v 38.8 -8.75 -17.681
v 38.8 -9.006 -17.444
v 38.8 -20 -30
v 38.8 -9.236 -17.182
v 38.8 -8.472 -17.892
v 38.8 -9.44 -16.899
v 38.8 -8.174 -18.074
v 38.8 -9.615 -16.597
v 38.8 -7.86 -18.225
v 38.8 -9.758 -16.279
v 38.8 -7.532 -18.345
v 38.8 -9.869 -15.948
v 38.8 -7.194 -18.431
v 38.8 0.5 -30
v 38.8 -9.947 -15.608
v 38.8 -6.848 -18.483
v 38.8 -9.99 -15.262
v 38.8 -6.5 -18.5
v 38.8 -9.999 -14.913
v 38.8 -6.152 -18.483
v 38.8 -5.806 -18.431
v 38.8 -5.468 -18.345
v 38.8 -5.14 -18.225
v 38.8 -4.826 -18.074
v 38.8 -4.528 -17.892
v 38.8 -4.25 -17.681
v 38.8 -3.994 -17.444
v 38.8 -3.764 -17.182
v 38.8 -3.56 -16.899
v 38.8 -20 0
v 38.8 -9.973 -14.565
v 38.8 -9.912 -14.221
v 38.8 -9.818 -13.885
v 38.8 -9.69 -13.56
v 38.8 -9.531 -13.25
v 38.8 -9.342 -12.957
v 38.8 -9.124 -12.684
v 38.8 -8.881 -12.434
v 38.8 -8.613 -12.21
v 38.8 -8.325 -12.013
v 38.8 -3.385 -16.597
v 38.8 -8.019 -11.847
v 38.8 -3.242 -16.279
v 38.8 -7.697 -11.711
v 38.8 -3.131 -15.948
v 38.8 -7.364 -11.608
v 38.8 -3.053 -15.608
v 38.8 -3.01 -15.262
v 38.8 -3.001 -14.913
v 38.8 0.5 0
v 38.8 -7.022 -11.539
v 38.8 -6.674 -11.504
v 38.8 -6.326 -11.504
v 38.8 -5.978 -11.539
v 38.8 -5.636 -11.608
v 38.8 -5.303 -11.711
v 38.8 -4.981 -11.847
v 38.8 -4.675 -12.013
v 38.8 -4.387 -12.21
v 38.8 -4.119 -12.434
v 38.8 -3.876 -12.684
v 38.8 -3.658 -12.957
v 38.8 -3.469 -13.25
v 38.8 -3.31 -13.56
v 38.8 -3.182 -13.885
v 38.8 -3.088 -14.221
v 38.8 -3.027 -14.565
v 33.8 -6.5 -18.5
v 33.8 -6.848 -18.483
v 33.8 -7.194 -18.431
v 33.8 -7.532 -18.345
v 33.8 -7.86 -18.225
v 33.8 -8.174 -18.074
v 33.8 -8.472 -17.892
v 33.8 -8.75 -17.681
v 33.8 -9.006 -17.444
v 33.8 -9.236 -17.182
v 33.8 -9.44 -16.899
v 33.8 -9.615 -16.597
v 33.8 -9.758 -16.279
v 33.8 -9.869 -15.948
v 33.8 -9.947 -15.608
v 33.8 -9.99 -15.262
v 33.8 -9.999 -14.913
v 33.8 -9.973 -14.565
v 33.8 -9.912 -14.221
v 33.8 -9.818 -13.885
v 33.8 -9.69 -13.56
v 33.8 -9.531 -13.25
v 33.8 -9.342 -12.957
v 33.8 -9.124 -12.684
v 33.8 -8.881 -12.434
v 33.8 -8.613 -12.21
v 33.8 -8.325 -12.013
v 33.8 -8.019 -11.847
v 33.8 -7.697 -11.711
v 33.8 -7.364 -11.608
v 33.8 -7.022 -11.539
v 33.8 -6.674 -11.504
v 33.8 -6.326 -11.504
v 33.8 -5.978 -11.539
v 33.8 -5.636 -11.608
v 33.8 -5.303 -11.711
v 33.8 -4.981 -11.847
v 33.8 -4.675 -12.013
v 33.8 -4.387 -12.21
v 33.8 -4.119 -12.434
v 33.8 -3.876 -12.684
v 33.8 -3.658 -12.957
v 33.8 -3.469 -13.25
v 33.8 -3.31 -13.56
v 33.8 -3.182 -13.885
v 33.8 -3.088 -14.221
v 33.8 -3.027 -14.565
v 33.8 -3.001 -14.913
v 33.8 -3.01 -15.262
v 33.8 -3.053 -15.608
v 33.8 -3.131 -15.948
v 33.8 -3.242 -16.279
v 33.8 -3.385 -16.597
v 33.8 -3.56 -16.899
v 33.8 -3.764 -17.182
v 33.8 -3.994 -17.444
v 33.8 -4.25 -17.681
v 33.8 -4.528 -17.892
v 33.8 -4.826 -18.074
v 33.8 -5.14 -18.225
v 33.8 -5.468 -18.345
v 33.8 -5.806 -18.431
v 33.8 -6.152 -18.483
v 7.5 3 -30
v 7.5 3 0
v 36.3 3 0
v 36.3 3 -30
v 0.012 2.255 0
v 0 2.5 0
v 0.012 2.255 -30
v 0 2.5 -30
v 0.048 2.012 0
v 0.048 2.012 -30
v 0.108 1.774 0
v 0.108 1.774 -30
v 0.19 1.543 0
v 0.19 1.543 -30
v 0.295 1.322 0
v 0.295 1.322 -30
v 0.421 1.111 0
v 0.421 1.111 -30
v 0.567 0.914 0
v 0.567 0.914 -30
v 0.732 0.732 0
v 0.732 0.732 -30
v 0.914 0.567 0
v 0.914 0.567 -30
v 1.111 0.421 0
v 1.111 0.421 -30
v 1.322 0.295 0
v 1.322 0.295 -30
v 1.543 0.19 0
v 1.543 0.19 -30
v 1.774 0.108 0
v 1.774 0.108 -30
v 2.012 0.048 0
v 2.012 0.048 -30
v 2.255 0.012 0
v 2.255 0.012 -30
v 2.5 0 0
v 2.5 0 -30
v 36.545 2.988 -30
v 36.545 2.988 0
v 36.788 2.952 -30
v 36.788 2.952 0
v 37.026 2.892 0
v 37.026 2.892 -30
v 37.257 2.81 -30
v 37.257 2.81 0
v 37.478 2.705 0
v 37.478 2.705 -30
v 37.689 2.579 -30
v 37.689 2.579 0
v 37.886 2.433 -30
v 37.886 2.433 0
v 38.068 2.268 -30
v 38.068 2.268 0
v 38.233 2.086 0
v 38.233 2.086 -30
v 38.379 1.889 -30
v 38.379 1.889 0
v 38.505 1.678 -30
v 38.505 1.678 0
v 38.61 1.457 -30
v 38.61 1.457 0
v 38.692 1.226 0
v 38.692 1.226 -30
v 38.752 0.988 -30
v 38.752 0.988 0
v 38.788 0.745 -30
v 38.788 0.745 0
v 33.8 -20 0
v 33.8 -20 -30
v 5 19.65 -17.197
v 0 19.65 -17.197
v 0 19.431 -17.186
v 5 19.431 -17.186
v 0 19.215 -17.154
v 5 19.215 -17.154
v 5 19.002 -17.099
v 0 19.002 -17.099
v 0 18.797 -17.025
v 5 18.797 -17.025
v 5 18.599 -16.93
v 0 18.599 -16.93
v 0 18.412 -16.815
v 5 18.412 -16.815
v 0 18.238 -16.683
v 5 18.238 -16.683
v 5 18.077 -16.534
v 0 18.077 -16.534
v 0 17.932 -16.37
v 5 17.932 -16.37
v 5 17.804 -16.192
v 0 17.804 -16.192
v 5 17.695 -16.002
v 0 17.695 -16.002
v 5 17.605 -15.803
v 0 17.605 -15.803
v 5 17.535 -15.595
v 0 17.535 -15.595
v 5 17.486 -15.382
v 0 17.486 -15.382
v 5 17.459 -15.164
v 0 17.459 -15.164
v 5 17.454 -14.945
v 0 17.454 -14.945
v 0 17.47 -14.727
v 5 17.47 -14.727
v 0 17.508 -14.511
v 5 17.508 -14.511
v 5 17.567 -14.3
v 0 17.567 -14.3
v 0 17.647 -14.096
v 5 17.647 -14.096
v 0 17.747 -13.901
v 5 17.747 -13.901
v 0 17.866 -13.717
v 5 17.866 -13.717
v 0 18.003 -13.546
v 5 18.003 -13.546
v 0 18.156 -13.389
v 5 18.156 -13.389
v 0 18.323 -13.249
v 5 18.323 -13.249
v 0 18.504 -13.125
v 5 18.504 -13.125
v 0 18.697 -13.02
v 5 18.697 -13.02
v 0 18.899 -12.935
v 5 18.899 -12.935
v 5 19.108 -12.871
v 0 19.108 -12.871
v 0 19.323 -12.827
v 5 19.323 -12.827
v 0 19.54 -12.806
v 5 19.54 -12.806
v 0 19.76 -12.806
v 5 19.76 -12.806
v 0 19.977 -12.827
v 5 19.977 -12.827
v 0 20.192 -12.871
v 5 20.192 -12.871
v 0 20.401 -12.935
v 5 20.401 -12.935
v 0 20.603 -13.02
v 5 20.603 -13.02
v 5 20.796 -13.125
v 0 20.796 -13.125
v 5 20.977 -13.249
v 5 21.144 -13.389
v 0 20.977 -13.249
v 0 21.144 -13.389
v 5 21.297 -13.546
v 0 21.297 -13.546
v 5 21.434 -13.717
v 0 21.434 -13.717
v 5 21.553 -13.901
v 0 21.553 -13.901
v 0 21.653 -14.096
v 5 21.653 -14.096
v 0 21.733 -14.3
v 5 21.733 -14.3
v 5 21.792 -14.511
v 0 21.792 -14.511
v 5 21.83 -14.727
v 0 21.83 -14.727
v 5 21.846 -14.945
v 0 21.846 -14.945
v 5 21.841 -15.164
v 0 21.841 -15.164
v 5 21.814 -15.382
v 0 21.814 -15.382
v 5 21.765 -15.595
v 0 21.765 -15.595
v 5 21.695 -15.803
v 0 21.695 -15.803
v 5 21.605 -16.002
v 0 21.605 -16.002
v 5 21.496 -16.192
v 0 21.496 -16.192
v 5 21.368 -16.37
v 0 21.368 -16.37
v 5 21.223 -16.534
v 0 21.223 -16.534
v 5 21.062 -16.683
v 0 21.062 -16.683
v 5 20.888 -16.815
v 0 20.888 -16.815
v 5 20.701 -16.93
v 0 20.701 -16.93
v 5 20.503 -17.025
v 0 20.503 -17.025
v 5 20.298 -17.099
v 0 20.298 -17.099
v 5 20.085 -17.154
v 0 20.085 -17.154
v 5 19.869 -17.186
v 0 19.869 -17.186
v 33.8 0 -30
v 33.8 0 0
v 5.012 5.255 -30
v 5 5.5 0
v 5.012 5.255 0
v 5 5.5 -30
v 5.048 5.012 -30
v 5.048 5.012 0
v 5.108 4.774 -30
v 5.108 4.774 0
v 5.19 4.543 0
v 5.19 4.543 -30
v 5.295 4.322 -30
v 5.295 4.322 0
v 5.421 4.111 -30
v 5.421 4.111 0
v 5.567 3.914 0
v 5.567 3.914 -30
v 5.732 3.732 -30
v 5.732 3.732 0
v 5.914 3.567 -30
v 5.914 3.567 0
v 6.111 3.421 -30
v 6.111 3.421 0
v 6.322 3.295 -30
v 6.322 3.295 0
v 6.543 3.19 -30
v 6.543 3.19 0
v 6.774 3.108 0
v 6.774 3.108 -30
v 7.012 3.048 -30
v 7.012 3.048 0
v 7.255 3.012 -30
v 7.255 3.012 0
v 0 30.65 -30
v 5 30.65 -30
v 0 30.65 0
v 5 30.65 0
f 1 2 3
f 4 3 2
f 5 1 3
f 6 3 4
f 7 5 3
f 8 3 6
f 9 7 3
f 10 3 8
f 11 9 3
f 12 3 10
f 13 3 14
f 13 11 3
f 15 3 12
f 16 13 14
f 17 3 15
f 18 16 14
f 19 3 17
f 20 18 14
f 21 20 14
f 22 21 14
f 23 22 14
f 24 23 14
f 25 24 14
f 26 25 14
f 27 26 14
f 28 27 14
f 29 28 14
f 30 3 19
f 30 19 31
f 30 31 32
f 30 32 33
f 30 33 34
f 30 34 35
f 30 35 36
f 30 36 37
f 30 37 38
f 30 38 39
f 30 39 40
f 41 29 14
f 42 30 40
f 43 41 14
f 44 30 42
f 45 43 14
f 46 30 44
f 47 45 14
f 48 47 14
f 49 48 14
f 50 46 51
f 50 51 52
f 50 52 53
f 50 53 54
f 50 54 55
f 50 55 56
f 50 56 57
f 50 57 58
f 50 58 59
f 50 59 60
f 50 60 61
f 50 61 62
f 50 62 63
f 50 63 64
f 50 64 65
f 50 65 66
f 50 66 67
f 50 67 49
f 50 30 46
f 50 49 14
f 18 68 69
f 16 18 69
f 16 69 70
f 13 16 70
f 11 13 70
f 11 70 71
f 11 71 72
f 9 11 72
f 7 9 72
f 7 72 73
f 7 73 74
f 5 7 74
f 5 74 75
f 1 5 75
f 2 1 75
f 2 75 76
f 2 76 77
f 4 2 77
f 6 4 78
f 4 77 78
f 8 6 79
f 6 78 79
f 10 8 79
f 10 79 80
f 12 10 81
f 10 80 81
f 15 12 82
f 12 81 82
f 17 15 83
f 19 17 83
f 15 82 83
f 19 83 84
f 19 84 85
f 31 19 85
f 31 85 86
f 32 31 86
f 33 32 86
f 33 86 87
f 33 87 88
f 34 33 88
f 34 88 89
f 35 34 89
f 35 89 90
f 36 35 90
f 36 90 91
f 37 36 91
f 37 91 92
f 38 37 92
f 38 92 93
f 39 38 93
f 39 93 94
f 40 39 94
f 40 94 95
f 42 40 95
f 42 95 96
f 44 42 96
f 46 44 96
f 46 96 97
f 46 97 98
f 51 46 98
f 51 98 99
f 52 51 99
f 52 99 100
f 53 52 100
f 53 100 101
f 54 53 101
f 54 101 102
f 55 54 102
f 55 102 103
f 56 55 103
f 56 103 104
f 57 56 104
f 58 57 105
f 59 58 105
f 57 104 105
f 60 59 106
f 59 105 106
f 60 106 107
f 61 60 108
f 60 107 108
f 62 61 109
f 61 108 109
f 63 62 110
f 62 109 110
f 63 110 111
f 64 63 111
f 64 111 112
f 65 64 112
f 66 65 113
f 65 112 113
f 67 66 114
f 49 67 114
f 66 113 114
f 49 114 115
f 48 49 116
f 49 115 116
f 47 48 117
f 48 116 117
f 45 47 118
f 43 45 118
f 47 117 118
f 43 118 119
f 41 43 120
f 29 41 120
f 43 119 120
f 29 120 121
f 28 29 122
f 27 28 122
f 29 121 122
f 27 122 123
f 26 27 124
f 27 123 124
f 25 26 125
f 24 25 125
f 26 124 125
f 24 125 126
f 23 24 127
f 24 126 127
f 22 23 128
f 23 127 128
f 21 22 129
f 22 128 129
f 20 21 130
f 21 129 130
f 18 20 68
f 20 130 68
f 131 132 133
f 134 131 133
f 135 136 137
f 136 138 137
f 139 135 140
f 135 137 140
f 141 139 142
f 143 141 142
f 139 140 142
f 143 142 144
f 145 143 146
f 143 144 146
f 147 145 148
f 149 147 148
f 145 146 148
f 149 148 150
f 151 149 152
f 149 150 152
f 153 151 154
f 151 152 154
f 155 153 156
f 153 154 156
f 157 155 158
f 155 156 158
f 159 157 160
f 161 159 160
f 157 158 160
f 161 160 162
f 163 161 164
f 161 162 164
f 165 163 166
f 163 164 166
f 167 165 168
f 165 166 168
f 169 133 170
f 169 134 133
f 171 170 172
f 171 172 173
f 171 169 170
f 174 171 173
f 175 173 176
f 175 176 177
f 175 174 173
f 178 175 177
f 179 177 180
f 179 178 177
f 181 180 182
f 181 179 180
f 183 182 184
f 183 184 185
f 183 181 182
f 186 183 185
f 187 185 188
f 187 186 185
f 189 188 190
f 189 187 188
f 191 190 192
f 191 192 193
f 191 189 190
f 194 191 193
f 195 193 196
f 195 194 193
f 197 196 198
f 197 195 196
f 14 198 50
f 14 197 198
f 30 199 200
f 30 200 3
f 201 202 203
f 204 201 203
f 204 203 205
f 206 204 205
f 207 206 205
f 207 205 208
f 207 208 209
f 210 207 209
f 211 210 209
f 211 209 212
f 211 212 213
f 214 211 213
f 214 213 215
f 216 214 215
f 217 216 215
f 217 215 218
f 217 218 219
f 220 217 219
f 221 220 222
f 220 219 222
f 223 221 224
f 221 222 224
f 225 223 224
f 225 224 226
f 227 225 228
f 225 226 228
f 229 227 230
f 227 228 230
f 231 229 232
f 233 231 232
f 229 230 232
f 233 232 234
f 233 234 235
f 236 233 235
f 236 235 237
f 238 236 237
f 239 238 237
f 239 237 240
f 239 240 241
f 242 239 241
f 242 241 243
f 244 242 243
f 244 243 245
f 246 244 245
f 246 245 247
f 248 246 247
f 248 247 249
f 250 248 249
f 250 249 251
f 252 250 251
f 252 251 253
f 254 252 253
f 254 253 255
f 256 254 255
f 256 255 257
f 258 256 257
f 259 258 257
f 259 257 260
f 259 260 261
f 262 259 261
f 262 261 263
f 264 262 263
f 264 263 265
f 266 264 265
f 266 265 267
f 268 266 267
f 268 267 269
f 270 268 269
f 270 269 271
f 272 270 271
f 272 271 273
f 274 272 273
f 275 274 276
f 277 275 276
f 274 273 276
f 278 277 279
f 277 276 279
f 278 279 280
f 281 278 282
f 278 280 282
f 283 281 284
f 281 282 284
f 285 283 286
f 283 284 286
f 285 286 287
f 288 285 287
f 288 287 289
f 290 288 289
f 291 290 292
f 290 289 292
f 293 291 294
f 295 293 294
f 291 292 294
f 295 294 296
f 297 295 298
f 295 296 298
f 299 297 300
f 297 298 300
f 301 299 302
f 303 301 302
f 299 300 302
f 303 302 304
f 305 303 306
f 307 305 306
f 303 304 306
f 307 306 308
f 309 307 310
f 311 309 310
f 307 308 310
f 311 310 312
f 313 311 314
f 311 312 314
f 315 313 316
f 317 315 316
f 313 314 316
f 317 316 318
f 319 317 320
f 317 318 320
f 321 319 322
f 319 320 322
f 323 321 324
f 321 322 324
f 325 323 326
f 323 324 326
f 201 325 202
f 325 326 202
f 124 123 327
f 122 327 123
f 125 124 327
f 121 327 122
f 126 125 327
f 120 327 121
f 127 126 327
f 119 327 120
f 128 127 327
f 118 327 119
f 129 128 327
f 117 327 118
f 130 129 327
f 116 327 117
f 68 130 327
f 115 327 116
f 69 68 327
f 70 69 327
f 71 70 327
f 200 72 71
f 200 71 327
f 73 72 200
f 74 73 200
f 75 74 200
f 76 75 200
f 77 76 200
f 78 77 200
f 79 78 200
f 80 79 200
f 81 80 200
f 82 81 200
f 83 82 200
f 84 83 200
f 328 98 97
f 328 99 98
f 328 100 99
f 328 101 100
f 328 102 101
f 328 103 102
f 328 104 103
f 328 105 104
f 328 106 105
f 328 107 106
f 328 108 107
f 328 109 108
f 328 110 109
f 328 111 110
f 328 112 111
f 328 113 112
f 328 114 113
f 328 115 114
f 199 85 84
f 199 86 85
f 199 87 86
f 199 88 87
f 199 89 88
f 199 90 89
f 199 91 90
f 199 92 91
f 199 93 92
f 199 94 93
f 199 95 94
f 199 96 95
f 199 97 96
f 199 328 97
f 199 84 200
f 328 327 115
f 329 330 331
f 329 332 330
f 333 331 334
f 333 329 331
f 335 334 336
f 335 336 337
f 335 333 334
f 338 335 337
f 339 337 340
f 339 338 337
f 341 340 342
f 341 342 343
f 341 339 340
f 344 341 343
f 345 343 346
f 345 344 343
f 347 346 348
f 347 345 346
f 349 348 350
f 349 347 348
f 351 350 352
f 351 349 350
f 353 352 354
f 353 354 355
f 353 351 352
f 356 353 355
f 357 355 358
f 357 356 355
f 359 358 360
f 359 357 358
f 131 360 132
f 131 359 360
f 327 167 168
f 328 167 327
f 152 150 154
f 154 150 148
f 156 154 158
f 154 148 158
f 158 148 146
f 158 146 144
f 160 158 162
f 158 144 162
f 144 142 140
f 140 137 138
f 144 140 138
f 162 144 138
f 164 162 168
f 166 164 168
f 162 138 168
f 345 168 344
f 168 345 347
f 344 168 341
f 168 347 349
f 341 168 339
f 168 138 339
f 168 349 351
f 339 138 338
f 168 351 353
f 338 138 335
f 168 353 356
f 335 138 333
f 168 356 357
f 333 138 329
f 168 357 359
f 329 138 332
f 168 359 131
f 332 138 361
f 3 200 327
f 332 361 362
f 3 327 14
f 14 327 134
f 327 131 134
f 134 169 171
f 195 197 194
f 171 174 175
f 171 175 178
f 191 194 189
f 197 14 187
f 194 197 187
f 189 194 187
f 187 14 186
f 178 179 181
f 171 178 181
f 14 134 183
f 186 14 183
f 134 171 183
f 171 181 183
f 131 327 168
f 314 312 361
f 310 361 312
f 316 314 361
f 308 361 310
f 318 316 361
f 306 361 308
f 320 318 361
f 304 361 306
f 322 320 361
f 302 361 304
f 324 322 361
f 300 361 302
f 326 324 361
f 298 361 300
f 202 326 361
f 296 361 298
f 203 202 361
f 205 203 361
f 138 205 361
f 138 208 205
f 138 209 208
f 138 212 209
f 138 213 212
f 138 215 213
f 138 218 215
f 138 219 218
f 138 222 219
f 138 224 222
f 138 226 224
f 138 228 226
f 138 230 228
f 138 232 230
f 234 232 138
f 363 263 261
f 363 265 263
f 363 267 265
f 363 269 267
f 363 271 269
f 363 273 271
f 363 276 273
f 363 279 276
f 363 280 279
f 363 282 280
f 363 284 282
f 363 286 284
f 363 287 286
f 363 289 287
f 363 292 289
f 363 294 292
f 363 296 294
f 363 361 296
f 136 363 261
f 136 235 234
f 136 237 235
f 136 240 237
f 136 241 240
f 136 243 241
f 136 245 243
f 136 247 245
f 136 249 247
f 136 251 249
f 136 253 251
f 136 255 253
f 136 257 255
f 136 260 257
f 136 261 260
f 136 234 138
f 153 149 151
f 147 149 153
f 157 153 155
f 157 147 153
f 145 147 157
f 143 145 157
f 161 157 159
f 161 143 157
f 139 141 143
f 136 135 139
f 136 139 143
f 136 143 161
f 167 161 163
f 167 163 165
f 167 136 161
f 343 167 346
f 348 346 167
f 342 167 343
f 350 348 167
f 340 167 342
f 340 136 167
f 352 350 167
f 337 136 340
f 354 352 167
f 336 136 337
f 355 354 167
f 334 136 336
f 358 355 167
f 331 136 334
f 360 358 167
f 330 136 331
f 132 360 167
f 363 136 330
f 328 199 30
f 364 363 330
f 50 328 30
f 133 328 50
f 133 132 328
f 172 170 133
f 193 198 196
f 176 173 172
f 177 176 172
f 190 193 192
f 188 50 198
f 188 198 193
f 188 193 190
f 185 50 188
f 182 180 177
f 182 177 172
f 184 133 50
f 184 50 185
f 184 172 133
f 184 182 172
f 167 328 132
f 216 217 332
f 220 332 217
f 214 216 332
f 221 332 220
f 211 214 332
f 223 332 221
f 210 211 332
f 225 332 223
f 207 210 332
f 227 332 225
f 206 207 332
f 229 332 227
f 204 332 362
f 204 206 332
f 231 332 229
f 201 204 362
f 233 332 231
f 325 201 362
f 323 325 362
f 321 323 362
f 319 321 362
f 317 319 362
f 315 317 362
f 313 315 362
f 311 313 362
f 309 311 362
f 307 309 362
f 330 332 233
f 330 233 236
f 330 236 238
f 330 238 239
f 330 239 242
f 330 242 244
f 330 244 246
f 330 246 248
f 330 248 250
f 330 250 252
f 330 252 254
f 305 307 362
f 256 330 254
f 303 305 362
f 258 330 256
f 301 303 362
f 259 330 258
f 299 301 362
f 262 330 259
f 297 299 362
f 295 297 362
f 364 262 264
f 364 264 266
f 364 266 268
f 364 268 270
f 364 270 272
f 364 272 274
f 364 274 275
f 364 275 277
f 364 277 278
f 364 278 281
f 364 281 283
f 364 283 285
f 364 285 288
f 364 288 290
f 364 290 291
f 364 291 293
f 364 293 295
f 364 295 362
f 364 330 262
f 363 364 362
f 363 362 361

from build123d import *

# Parameters (mm, degrees)
EXTRUDE_THIN1_DEPTH              = 30
F_7_0_7_DIAMETER_HOLE1_D         = 7
TAPPED_HOLE_FOR_8_32_HELICOIL1_D = 4.3942
SKETCH5_W                        = 43.8
SKETCH5_H                        = 32.238868154
EXTRUDE1_DEPTH                   = 31
FILLET1_R                        = 2.5


with BuildPart() as part:
    # Sketch1 → Extrude-Thin1 (new body)
    with BuildSketch(Plane.XY):
        Polygon((0, 30.65), (0, 0), (33.8, 0), (33.8, -20), (38.8, -20), (38.8, 5), (5, 5), (5, 30.65), align=None)
    extrude(amount=-EXTRUDE_THIN1_DEPTH)

    # Ø7.0 (7) Diameter Hole1 (through all)
    with Locations(Plane(origin=(38.8, -6.5, -15), x_dir=(0, 0, 1), z_dir=(1, 0, 0))):
        with Locations((0, 0)):
            Hole(F_7_0_7_DIAMETER_HOLE1_D / 2)

    # Tapped Hole for #8-32 Helicoil1 (through all)
    with Locations(Plane(origin=(5, 19.65, -15), x_dir=(0, 0, 1), z_dir=(1, 0, 0))):
        with Locations((0, 0)):
            Hole(TAPPED_HOLE_FOR_8_32_HELICOIL1_D / 2)

    # Sketch5 → Extrude1 (cut, through all)
    with BuildSketch(Plane.XY):
        with Locations((26.9, 19.119434077)):
            Rectangle(SKETCH5_W, SKETCH5_H)
    extrude(amount=-EXTRUDE1_DEPTH, mode=Mode.SUBTRACT)

    # Fillet1
    fillet1_edges = [part.edges().sort_by_distance(p)[0] for p in [
        (0, 0, -15),
        (38.8, 3, -15),
        (5, 3, -15),
    ]]
    fillet(fillet1_edges, radius=FILLET1_R)


solid = part.part
